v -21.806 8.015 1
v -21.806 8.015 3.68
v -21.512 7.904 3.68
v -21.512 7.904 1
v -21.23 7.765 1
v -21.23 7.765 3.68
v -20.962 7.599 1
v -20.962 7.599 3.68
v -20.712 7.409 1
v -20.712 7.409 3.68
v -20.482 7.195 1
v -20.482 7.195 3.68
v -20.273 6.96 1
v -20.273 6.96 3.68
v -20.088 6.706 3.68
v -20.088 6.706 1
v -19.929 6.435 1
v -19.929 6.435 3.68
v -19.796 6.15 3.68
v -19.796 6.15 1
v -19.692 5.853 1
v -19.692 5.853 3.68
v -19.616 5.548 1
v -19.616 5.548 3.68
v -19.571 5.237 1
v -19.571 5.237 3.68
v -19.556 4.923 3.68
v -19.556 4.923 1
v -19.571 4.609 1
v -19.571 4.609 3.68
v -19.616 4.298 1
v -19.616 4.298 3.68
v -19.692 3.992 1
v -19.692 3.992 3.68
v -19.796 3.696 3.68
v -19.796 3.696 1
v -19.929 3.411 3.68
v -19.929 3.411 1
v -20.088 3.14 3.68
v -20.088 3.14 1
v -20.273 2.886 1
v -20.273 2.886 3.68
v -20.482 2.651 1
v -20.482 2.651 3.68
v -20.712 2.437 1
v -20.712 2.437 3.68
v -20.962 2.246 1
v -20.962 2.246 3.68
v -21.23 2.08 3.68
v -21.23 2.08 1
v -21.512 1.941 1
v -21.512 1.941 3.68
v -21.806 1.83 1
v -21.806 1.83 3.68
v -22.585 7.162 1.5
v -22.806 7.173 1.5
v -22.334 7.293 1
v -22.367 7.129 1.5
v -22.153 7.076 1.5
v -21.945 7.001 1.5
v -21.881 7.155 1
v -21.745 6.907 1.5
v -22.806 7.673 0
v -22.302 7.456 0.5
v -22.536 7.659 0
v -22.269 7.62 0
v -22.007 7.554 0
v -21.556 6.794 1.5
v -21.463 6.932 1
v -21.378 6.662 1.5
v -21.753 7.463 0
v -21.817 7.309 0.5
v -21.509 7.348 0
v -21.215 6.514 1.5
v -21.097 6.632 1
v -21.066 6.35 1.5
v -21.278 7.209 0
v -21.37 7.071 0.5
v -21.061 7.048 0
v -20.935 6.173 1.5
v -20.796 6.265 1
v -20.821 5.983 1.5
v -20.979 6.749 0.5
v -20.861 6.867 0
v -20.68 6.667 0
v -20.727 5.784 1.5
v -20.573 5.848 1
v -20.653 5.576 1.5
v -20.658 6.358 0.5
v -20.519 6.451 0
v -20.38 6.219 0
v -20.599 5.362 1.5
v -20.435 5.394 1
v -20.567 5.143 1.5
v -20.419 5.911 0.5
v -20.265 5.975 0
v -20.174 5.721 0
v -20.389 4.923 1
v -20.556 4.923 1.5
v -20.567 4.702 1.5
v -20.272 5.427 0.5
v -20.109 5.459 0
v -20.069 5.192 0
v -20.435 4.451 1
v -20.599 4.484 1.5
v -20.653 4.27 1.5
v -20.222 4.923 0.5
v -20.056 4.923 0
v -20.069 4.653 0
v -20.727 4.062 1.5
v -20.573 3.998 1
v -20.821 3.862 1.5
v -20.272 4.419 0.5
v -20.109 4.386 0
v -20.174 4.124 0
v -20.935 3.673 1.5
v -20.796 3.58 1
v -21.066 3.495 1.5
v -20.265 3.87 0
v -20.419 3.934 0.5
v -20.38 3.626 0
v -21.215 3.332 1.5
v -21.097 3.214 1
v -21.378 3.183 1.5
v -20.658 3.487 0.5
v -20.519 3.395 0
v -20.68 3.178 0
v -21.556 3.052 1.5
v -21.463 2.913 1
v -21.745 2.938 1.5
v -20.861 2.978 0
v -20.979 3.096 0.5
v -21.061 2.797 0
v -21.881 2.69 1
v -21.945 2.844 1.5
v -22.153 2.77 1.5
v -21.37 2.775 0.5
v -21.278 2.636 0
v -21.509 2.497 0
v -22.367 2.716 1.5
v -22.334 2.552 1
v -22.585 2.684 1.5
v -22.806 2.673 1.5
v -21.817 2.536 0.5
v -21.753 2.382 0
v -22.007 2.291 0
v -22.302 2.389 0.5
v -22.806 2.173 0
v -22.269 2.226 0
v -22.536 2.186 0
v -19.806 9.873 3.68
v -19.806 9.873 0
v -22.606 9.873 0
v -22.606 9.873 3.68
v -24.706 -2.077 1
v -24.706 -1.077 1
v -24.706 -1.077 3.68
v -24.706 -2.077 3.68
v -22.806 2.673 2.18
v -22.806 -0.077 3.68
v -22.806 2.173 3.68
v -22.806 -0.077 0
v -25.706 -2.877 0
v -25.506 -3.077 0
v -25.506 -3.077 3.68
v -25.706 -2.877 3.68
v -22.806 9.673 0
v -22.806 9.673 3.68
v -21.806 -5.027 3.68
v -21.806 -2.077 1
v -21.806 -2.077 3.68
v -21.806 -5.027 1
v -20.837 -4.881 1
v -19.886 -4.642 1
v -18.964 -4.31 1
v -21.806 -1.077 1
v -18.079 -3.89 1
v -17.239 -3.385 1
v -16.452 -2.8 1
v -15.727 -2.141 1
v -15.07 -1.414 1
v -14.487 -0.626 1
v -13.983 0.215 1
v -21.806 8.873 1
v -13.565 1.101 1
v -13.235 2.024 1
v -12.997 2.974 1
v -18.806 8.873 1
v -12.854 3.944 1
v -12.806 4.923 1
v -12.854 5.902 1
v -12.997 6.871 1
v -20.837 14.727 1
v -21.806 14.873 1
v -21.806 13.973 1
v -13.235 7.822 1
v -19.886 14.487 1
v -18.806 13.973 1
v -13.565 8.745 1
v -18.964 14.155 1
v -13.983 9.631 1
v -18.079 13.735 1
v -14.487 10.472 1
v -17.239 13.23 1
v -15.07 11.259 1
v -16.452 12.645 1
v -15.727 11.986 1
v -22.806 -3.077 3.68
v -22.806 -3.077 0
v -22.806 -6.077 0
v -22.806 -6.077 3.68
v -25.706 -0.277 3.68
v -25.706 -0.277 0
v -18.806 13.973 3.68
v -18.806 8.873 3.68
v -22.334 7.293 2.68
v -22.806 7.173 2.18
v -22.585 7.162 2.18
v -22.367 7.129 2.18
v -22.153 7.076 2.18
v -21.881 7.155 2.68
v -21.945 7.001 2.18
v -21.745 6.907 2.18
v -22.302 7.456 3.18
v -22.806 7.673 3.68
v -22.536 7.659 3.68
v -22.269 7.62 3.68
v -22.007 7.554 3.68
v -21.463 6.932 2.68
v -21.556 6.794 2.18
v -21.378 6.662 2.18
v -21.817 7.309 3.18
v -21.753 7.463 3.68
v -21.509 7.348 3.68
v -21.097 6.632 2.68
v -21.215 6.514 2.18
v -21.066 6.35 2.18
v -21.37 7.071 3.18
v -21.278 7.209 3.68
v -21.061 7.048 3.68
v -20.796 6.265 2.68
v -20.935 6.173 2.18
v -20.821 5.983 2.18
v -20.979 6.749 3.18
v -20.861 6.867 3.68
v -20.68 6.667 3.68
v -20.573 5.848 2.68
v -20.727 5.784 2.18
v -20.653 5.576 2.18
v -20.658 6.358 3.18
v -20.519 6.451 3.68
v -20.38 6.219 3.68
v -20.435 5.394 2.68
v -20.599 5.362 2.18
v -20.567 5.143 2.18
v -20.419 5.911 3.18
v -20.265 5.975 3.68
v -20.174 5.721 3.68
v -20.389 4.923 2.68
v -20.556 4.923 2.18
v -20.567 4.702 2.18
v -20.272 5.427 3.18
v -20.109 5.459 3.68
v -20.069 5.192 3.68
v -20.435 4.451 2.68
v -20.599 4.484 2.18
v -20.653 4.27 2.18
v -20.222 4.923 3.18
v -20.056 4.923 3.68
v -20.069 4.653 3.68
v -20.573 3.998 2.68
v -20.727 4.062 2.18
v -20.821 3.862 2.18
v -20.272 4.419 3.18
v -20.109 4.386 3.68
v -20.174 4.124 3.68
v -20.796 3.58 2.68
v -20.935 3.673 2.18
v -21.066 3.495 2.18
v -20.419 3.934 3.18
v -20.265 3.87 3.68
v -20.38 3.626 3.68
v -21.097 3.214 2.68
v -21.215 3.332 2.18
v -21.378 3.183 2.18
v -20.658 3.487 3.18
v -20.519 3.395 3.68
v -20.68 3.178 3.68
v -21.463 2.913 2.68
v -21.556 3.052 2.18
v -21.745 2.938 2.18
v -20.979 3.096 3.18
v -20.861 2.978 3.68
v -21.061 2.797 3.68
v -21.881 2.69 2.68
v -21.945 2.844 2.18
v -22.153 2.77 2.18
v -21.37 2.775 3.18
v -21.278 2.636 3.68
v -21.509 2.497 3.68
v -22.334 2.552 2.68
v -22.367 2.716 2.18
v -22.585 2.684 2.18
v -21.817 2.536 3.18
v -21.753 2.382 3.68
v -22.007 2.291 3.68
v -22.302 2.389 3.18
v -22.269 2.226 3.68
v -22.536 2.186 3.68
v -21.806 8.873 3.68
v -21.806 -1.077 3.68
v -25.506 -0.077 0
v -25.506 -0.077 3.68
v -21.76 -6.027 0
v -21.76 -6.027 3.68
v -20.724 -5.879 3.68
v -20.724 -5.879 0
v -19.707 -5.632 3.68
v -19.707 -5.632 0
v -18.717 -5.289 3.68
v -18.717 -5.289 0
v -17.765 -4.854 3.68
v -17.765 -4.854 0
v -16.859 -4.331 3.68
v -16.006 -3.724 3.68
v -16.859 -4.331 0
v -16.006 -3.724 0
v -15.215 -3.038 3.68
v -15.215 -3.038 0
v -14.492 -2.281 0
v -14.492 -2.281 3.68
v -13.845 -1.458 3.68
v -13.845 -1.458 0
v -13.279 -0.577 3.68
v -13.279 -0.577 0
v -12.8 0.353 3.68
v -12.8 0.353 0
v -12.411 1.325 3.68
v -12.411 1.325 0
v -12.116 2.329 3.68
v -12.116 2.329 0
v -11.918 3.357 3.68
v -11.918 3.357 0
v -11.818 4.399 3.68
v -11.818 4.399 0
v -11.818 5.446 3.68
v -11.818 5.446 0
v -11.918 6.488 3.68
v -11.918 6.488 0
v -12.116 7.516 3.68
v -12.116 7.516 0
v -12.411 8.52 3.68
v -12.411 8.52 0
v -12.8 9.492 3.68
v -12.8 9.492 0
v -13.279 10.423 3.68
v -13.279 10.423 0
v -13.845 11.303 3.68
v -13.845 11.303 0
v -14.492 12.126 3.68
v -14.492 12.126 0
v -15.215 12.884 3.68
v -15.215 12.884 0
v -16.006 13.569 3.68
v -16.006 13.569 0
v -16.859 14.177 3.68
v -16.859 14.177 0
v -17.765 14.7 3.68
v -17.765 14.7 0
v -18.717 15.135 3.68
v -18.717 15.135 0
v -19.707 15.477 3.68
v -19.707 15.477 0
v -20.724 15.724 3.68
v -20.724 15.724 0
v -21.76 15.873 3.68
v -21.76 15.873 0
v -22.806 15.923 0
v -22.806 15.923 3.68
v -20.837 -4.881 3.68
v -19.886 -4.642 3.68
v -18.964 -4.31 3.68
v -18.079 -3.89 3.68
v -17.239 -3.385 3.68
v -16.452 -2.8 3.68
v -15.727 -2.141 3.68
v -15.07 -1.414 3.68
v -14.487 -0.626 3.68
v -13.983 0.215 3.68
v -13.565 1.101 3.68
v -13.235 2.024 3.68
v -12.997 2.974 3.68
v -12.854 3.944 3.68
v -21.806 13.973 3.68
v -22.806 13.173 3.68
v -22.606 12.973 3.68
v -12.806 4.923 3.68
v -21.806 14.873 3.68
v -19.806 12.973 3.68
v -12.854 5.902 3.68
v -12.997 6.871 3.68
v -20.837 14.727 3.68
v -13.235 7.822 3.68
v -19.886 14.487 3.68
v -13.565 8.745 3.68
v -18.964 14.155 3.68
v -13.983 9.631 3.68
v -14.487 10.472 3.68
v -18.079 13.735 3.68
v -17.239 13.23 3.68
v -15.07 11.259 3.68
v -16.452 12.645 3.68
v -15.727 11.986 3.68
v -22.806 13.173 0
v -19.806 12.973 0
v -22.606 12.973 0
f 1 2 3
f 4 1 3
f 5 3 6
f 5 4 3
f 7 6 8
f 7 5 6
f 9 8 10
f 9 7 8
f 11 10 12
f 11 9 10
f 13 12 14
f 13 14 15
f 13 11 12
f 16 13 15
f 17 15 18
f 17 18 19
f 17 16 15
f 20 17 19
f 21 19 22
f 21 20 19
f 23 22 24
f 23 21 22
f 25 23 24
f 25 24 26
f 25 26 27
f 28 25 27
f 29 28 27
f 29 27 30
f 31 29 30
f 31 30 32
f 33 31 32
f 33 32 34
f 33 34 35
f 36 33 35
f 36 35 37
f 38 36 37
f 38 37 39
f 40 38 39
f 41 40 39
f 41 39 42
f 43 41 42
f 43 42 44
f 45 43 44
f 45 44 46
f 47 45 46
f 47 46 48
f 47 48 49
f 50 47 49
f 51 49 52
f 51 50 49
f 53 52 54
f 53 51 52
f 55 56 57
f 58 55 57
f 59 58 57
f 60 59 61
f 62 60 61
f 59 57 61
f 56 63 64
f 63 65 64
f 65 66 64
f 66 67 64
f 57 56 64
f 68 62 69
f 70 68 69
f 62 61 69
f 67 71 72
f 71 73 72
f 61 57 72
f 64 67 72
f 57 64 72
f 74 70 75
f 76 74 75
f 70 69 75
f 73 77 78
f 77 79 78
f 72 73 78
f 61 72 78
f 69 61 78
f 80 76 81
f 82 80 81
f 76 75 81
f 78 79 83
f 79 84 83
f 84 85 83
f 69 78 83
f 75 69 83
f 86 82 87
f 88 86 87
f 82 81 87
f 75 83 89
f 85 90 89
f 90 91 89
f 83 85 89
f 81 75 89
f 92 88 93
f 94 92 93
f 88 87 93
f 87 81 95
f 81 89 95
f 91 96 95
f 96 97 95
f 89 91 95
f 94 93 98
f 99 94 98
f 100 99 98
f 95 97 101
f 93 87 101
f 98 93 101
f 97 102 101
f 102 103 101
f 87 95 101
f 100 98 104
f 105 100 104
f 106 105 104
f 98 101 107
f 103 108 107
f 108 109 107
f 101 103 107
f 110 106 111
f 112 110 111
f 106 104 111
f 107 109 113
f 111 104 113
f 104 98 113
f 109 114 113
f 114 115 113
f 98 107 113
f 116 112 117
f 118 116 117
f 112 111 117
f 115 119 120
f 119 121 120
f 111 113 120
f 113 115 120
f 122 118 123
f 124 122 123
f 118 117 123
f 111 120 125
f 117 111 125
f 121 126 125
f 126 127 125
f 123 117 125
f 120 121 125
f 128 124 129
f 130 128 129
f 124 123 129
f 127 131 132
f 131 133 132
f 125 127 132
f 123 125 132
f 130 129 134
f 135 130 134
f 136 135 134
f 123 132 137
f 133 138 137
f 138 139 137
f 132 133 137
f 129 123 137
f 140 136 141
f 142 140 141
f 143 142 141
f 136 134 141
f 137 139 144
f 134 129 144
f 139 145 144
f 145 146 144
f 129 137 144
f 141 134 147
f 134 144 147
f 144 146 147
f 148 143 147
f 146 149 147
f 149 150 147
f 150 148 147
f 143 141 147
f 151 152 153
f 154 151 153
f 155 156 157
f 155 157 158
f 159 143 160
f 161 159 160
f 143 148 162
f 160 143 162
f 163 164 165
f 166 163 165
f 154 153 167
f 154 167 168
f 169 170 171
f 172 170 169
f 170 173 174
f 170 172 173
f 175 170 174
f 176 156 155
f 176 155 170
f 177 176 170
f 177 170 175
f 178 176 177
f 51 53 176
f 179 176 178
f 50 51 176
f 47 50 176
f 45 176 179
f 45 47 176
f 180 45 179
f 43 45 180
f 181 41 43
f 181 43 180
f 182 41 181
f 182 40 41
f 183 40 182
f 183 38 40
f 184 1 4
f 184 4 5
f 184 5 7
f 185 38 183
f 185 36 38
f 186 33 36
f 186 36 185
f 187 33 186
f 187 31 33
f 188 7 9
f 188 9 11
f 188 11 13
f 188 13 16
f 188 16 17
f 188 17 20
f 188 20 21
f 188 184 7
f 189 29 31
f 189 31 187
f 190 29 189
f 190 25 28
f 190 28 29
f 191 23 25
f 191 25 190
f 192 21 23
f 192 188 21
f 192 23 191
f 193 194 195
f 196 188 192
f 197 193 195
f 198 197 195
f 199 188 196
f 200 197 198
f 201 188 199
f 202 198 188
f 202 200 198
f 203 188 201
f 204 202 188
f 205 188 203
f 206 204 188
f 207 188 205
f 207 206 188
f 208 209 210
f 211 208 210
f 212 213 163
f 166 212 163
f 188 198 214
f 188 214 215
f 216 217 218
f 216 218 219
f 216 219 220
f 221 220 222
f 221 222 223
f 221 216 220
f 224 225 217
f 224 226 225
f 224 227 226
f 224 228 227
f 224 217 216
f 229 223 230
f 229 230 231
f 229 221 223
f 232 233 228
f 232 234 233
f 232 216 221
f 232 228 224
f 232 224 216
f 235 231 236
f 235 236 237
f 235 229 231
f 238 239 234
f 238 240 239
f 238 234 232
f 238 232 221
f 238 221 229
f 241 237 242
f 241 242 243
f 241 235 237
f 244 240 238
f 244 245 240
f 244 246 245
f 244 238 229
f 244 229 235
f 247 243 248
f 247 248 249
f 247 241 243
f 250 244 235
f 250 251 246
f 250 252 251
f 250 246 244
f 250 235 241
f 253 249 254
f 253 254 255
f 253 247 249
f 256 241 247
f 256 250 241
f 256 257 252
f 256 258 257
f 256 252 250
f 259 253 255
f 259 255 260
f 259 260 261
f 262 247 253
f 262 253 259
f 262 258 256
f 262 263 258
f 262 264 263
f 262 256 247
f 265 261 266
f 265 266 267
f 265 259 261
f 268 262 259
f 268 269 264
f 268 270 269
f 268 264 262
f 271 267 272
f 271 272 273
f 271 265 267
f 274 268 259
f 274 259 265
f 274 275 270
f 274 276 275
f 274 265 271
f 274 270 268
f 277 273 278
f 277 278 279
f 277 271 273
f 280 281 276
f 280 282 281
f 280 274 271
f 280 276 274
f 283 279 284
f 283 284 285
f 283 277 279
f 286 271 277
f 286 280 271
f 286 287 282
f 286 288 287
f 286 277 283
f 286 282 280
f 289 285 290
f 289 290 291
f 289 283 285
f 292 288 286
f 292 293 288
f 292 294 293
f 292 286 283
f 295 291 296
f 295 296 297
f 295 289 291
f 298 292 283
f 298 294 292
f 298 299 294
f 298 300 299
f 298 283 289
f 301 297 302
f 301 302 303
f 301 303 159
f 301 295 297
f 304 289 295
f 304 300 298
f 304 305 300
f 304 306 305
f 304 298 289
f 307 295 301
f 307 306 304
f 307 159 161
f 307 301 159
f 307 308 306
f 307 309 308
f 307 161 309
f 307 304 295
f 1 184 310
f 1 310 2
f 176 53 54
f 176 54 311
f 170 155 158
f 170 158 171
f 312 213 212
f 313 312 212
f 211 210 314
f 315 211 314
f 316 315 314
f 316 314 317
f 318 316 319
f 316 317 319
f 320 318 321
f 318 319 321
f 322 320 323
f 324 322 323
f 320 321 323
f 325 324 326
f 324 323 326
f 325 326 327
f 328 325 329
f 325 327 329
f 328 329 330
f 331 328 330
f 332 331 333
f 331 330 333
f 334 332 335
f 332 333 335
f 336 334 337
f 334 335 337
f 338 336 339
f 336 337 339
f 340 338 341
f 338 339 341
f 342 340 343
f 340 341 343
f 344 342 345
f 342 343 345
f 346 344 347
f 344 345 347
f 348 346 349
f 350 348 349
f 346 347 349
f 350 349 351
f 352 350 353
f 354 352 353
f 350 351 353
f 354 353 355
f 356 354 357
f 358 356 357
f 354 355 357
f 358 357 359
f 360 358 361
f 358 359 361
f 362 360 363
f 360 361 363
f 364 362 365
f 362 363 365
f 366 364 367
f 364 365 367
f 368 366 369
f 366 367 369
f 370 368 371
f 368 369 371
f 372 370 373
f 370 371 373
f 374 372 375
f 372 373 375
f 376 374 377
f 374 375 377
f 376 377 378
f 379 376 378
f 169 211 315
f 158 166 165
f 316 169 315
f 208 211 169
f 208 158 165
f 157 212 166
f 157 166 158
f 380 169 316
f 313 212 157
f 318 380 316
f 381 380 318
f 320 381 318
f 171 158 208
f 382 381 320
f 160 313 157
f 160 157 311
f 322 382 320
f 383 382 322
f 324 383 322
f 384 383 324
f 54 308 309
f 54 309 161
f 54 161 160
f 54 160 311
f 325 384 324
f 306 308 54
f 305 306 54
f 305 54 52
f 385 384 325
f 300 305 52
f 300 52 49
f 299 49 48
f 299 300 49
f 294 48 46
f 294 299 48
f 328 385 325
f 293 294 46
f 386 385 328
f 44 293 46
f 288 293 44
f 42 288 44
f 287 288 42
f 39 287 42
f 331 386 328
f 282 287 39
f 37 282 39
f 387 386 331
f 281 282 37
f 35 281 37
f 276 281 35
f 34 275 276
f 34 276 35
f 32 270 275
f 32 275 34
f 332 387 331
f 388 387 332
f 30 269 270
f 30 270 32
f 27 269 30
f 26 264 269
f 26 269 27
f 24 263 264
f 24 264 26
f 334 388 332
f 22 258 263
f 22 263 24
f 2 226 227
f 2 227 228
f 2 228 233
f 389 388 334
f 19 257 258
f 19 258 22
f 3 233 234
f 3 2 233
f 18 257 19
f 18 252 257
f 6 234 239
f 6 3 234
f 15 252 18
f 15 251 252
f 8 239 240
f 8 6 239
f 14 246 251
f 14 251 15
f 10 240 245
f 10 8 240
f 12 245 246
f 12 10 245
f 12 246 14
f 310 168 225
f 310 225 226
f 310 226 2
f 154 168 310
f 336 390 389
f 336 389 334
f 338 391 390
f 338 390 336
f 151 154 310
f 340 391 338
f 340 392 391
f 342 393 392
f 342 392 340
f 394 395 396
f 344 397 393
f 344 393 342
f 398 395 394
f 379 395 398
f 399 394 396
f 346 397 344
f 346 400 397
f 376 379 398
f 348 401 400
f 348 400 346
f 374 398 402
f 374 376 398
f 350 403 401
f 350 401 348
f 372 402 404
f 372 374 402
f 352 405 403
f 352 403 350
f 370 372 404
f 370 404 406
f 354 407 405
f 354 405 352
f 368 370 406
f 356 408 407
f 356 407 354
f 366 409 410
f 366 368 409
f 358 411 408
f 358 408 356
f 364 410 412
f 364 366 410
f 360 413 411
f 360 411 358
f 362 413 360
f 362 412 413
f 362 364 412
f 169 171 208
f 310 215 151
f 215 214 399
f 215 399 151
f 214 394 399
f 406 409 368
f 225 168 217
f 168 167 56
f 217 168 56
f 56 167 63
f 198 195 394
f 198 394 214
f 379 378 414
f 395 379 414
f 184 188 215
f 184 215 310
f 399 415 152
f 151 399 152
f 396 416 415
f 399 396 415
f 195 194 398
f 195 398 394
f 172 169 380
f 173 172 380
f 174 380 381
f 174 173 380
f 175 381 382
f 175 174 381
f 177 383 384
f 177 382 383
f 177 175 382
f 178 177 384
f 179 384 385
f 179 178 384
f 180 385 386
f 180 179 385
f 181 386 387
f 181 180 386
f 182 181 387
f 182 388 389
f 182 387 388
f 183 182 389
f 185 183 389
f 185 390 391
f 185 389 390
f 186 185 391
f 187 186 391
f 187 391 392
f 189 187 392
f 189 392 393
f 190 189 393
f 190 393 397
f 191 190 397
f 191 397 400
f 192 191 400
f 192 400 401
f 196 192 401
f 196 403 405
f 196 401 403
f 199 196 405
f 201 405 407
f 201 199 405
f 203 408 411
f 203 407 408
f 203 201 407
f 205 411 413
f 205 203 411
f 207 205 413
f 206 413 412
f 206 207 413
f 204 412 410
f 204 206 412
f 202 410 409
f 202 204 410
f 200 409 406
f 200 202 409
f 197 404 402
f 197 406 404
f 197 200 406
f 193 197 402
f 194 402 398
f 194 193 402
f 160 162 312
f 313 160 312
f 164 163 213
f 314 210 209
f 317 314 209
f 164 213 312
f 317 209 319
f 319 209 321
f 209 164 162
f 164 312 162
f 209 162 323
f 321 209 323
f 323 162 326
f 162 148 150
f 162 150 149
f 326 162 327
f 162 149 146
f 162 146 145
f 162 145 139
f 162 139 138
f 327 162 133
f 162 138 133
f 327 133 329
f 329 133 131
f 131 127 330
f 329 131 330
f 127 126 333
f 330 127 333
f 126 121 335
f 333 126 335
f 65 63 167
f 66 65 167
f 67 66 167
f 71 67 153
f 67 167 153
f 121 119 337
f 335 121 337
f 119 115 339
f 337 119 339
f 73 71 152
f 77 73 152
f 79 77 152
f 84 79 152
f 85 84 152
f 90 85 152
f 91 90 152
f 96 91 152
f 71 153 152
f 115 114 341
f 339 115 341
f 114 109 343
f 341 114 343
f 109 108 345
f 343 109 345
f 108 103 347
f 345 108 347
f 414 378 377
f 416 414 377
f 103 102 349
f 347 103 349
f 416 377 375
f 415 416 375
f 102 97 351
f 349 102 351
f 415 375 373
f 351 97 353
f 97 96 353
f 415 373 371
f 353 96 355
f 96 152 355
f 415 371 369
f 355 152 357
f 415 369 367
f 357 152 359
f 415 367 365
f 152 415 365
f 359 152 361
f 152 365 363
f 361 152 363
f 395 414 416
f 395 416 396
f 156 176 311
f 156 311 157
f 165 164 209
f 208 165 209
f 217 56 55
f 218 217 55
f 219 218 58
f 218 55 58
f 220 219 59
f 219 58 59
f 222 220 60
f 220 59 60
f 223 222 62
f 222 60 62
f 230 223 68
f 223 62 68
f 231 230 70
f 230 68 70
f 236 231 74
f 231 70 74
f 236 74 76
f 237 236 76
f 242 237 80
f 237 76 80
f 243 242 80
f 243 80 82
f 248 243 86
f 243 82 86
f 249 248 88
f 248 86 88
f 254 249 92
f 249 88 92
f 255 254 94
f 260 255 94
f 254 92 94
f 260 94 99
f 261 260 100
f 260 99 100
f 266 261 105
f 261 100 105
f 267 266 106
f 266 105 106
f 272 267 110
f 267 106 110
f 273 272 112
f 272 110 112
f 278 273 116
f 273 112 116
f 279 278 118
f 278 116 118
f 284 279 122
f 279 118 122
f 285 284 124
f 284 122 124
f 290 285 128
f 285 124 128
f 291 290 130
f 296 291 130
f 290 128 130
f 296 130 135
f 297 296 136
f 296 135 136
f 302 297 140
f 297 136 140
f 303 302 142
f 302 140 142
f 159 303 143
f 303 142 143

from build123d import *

# Parameters (mm, degrees)
F1_DEPTH = 3.68
F2_T     = -1
F3_SIZE2 = 0.5
F3_SIZE  = 1.5
F4_SIZE  = 0.2


with BuildPart() as f1:
    # F0 (on Top) → F1 (new body)
    with BuildSketch(Plane.XY):
        with BuildLine():
            Line((-22.8056685835, -3.0772873983), (-22.8056685835, -6.0772873983))
            ThreePointArc((-22.8056685835, -6.0772873983), (-11.8056685835, 4.9227126017), (-22.8056685835, 15.9227126017))
            Line((-22.8056685835, 15.9227126017), (-22.8056685835, 12.9727126017))
            Line((-22.8056685835, 12.9727126017), (-19.8056685835, 12.9727126017))
            Line((-19.8056685835, 12.9727126017), (-19.8056685835, 9.8727126017))
            Line((-19.8056685835, 9.8727126017), (-22.8056685835, 9.8727126017))
            Line((-22.8056685835, 9.8727126017), (-22.8056685835, 7.1727126017))
            ThreePointArc((-22.8056685835, 7.1727126017), (-20.5556685835, 4.9227126017), (-22.8056685835, 2.6727126017))
            Line((-22.8056685835, 2.6727126017), (-22.8056685835, -0.0772873983))
            Line((-22.8056685835, -0.0772873983), (-25.7056685835, -0.0772873983))
            Line((-25.7056685835, -0.0772873983), (-25.7056685835, -3.0772873983))
            Line((-25.7056685835, -3.0772873983), (-22.8056685835, -3.0772873983))
        make_face()
    extrude(amount=F1_DEPTH)

    # F2
    f2_openings = [f1.faces().sort_by_distance(p)[0] for p in [
        (-18.10535, 4.278135, 3.68),
    ]]
    offset(amount=F2_T, openings=f2_openings, kind=Kind.INTERSECTION)

    # F3
    f3_edges = [f1.edges().sort_by_distance(p)[0] for p in [
        (-20.555669, 4.922713, 3.68),
        (-20.555669, 4.922713, 0),
    ]]
    f3_side = f1.faces().sort_by_distance((-20.555669, 4.922713, 1.84))[0]
    chamfer(f3_edges, length=F3_SIZE, length2=F3_SIZE2, reference=f3_side)

    # F4
    f4_edges = [f1.edges().sort_by_distance(p)[0] for p in [
        (-25.705669, -0.077287, 1.84),
        (-25.705669, -3.077287, 1.84),
        (-22.805669, 9.872713, 1.84),
        (-22.805669, 12.972713, 1.84),
    ]]
    chamfer(f4_edges, length=F4_SIZE)


solid = f1.part
